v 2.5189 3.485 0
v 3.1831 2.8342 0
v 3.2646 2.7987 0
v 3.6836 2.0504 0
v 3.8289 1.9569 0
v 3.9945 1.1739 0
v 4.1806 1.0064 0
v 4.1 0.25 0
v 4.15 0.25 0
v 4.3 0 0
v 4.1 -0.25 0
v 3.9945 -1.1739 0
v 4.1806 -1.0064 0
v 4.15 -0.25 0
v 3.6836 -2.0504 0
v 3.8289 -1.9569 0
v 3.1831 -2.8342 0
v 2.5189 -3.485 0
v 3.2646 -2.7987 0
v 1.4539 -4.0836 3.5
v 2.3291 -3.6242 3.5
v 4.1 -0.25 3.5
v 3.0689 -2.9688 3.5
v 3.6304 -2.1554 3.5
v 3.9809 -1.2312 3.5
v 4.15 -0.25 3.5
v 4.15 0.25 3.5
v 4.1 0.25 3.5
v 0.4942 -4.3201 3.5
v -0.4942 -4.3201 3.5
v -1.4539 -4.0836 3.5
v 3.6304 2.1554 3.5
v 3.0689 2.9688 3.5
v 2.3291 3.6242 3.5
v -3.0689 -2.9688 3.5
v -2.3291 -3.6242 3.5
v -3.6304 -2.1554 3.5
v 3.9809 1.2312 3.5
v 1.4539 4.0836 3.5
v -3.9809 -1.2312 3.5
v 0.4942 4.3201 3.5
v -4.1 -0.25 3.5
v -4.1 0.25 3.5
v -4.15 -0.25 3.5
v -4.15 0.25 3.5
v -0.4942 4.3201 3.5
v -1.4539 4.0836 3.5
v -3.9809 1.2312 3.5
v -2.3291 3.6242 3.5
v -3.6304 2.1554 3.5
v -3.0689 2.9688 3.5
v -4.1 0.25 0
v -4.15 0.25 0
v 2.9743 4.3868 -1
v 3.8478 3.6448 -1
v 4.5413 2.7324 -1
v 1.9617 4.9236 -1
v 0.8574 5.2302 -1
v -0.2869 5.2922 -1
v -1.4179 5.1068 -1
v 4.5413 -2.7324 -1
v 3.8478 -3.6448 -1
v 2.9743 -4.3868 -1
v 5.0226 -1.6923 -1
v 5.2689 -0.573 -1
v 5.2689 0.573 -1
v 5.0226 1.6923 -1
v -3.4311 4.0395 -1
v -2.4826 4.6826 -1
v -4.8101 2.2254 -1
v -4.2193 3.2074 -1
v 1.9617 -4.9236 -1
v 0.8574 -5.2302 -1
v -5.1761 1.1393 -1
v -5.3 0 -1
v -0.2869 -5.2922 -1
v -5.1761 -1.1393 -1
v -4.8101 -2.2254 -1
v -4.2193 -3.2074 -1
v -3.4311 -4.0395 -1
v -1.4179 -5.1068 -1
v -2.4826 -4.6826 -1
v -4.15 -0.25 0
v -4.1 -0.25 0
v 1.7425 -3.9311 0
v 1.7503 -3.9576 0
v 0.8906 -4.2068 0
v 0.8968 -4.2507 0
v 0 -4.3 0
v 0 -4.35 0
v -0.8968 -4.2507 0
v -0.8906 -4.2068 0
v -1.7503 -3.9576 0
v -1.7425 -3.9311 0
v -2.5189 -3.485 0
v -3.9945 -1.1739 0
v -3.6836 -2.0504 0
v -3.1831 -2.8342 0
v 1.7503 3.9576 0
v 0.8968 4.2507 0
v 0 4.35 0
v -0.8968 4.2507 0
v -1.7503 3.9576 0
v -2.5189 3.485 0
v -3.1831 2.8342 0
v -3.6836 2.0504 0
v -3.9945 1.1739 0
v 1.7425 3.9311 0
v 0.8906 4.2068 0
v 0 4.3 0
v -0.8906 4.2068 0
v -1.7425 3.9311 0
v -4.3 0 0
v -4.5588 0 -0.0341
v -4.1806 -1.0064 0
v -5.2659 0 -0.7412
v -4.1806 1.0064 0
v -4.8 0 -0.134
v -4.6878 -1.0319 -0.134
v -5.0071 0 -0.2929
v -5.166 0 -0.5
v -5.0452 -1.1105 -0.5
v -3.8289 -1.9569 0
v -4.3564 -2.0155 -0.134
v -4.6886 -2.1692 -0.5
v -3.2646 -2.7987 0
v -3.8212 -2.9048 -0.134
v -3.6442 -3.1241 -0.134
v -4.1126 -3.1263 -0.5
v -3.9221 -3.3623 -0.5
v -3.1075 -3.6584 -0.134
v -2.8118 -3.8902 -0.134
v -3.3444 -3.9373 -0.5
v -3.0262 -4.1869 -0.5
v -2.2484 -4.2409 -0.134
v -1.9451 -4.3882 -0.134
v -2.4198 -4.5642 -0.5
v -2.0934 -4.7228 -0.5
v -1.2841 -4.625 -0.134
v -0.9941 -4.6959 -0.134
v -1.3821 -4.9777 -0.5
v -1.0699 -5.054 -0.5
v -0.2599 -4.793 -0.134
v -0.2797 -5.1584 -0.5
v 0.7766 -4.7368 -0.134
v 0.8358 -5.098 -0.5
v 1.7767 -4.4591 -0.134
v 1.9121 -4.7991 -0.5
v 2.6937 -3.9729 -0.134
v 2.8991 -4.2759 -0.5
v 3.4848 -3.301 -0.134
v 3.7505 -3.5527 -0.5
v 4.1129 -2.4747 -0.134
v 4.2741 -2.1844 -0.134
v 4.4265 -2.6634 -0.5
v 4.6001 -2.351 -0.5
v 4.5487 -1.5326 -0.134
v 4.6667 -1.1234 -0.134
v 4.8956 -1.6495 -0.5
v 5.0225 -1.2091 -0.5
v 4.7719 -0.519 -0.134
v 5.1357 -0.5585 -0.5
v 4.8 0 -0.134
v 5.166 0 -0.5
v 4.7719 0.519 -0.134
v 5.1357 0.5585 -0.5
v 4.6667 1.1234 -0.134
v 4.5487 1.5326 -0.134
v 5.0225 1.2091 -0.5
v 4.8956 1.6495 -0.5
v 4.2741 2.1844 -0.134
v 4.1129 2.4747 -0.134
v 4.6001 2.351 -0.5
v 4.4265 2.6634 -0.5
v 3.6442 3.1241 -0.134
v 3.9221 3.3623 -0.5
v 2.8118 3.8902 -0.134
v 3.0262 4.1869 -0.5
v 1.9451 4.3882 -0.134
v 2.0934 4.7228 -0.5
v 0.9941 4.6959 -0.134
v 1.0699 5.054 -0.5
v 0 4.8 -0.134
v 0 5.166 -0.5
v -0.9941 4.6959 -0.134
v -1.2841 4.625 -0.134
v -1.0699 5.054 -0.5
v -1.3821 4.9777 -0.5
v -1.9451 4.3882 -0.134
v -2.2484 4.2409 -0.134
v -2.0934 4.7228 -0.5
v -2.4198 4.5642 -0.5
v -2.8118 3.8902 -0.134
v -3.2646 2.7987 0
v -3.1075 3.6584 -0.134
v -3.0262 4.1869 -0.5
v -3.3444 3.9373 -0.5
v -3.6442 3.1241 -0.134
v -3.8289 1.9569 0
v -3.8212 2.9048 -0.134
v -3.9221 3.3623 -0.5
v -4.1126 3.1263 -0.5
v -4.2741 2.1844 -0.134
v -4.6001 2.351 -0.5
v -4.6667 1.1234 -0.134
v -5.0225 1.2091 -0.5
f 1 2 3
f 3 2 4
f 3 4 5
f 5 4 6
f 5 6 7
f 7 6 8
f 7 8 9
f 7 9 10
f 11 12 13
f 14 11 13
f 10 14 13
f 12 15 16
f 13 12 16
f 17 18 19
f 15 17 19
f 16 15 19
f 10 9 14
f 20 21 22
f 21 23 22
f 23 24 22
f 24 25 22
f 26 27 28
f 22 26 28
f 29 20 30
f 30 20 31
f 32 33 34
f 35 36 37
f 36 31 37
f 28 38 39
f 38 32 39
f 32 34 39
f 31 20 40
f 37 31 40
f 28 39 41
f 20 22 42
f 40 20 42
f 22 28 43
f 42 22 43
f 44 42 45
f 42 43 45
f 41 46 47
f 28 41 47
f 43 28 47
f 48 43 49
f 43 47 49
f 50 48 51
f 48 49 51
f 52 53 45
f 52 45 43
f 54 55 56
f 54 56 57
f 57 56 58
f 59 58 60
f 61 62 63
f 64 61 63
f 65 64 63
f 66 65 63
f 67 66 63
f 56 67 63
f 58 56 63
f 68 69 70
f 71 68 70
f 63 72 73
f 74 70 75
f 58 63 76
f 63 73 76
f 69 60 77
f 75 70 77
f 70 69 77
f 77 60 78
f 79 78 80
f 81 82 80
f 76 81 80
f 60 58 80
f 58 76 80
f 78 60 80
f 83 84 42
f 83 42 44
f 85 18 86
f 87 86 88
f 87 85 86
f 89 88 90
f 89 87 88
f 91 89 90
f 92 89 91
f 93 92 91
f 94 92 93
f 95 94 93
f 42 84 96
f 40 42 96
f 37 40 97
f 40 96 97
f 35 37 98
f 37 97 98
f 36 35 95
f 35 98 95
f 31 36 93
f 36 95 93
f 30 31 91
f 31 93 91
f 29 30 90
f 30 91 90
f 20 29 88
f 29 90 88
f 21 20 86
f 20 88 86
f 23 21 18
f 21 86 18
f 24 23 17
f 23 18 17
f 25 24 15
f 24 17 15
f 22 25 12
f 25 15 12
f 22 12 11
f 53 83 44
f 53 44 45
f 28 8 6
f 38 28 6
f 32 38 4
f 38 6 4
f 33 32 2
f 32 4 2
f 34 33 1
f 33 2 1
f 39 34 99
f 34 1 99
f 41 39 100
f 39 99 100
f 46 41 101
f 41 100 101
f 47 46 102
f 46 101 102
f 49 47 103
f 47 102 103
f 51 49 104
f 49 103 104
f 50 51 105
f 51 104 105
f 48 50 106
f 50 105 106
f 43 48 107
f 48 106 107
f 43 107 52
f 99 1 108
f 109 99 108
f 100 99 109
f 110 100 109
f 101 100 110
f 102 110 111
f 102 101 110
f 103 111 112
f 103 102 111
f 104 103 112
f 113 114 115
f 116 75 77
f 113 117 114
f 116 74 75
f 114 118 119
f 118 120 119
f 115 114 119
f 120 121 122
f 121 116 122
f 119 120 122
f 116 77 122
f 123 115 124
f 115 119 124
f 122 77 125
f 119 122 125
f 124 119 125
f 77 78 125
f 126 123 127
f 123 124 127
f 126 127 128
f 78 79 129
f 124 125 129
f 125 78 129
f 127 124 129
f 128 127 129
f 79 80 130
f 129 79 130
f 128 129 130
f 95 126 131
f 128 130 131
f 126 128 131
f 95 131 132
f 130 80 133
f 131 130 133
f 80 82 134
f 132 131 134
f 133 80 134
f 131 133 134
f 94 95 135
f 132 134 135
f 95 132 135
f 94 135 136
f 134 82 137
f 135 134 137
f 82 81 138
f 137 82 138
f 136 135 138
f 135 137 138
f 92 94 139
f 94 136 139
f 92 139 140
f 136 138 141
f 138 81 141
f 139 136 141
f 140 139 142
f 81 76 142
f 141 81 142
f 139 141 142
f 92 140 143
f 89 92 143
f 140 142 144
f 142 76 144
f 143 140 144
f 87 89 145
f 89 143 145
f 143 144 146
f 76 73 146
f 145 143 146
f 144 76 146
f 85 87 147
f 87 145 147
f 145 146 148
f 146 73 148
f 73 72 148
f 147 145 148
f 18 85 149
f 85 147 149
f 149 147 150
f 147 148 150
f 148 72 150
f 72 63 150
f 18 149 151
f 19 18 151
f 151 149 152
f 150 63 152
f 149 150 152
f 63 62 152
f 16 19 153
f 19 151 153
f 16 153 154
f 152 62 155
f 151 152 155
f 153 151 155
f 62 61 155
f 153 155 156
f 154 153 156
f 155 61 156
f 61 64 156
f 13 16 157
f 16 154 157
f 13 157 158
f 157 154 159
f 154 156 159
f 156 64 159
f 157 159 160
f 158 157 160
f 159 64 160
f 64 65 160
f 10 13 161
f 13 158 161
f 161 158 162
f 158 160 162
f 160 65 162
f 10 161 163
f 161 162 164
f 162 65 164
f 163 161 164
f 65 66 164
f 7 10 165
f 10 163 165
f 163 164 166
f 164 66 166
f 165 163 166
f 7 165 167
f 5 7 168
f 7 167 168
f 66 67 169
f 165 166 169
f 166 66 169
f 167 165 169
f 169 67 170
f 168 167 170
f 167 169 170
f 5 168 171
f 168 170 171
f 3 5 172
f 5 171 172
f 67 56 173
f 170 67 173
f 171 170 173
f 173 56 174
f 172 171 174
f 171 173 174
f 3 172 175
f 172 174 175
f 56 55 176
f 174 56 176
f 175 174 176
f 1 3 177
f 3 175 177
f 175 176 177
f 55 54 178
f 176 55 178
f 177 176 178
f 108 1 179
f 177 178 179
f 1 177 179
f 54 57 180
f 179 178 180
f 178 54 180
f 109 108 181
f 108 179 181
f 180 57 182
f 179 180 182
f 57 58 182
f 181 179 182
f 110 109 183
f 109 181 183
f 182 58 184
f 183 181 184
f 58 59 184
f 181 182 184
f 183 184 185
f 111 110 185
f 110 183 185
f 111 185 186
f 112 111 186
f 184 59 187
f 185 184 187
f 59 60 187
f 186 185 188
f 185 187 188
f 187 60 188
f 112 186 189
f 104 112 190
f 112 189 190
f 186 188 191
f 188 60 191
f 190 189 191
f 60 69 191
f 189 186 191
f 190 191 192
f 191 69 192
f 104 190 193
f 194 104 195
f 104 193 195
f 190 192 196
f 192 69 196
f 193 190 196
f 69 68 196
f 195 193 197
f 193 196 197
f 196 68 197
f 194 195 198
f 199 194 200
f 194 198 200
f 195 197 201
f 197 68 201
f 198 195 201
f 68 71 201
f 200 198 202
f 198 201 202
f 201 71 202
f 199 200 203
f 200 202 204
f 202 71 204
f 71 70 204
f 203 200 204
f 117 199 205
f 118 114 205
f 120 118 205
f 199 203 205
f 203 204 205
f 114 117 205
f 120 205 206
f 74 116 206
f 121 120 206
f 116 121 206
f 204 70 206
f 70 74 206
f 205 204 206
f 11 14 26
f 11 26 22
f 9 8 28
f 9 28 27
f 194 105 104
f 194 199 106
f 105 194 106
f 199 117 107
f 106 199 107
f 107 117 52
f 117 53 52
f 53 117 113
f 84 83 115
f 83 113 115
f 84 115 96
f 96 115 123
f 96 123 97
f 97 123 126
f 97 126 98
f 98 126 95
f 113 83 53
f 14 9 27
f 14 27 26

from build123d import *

# Parameters (mm, degrees)
PAD_DEPTH = 3.5


with BuildPart() as part:
    # Sketch → Pad (new body)
    with BuildSketch(Plane.XY):
        with BuildLine():
            Line((-4.15, -0.25), (-4.15, 0.25))
            Line((-4.15, 0.25), (-4.1, 0.25))
            ThreePointArc((4.1, 0.25), (0, 4.35), (-4.1, 0.25))
            Line((4.1, 0.25), (4.15, 0.25))
            Line((4.15, 0.25), (4.15, -0.25))
            Line((4.15, -0.25), (4.1, -0.25))
            ThreePointArc((-4.1, -0.25), (0, -4.35), (4.1, -0.25))
            Line((-4.1, -0.25), (-4.15, -0.25))
        make_face()
    extrude(amount=PAD_DEPTH)

    # Sketch001 → Revolution (revolve)
    with BuildSketch(Plane.XZ):
        with BuildLine():
            Line((0, 0), (-4.3, 0))
            ThreePointArc((-4.3, 0), (-5.007107, -0.292893), (-5.3, -1))
            Line((-5.3, -1), (0, -1))
            Line((0, -1), (0, 0))
        make_face()
    revolve(axis=Axis((0, 0, 0), (0, 0, 1)))


solid = part.part
